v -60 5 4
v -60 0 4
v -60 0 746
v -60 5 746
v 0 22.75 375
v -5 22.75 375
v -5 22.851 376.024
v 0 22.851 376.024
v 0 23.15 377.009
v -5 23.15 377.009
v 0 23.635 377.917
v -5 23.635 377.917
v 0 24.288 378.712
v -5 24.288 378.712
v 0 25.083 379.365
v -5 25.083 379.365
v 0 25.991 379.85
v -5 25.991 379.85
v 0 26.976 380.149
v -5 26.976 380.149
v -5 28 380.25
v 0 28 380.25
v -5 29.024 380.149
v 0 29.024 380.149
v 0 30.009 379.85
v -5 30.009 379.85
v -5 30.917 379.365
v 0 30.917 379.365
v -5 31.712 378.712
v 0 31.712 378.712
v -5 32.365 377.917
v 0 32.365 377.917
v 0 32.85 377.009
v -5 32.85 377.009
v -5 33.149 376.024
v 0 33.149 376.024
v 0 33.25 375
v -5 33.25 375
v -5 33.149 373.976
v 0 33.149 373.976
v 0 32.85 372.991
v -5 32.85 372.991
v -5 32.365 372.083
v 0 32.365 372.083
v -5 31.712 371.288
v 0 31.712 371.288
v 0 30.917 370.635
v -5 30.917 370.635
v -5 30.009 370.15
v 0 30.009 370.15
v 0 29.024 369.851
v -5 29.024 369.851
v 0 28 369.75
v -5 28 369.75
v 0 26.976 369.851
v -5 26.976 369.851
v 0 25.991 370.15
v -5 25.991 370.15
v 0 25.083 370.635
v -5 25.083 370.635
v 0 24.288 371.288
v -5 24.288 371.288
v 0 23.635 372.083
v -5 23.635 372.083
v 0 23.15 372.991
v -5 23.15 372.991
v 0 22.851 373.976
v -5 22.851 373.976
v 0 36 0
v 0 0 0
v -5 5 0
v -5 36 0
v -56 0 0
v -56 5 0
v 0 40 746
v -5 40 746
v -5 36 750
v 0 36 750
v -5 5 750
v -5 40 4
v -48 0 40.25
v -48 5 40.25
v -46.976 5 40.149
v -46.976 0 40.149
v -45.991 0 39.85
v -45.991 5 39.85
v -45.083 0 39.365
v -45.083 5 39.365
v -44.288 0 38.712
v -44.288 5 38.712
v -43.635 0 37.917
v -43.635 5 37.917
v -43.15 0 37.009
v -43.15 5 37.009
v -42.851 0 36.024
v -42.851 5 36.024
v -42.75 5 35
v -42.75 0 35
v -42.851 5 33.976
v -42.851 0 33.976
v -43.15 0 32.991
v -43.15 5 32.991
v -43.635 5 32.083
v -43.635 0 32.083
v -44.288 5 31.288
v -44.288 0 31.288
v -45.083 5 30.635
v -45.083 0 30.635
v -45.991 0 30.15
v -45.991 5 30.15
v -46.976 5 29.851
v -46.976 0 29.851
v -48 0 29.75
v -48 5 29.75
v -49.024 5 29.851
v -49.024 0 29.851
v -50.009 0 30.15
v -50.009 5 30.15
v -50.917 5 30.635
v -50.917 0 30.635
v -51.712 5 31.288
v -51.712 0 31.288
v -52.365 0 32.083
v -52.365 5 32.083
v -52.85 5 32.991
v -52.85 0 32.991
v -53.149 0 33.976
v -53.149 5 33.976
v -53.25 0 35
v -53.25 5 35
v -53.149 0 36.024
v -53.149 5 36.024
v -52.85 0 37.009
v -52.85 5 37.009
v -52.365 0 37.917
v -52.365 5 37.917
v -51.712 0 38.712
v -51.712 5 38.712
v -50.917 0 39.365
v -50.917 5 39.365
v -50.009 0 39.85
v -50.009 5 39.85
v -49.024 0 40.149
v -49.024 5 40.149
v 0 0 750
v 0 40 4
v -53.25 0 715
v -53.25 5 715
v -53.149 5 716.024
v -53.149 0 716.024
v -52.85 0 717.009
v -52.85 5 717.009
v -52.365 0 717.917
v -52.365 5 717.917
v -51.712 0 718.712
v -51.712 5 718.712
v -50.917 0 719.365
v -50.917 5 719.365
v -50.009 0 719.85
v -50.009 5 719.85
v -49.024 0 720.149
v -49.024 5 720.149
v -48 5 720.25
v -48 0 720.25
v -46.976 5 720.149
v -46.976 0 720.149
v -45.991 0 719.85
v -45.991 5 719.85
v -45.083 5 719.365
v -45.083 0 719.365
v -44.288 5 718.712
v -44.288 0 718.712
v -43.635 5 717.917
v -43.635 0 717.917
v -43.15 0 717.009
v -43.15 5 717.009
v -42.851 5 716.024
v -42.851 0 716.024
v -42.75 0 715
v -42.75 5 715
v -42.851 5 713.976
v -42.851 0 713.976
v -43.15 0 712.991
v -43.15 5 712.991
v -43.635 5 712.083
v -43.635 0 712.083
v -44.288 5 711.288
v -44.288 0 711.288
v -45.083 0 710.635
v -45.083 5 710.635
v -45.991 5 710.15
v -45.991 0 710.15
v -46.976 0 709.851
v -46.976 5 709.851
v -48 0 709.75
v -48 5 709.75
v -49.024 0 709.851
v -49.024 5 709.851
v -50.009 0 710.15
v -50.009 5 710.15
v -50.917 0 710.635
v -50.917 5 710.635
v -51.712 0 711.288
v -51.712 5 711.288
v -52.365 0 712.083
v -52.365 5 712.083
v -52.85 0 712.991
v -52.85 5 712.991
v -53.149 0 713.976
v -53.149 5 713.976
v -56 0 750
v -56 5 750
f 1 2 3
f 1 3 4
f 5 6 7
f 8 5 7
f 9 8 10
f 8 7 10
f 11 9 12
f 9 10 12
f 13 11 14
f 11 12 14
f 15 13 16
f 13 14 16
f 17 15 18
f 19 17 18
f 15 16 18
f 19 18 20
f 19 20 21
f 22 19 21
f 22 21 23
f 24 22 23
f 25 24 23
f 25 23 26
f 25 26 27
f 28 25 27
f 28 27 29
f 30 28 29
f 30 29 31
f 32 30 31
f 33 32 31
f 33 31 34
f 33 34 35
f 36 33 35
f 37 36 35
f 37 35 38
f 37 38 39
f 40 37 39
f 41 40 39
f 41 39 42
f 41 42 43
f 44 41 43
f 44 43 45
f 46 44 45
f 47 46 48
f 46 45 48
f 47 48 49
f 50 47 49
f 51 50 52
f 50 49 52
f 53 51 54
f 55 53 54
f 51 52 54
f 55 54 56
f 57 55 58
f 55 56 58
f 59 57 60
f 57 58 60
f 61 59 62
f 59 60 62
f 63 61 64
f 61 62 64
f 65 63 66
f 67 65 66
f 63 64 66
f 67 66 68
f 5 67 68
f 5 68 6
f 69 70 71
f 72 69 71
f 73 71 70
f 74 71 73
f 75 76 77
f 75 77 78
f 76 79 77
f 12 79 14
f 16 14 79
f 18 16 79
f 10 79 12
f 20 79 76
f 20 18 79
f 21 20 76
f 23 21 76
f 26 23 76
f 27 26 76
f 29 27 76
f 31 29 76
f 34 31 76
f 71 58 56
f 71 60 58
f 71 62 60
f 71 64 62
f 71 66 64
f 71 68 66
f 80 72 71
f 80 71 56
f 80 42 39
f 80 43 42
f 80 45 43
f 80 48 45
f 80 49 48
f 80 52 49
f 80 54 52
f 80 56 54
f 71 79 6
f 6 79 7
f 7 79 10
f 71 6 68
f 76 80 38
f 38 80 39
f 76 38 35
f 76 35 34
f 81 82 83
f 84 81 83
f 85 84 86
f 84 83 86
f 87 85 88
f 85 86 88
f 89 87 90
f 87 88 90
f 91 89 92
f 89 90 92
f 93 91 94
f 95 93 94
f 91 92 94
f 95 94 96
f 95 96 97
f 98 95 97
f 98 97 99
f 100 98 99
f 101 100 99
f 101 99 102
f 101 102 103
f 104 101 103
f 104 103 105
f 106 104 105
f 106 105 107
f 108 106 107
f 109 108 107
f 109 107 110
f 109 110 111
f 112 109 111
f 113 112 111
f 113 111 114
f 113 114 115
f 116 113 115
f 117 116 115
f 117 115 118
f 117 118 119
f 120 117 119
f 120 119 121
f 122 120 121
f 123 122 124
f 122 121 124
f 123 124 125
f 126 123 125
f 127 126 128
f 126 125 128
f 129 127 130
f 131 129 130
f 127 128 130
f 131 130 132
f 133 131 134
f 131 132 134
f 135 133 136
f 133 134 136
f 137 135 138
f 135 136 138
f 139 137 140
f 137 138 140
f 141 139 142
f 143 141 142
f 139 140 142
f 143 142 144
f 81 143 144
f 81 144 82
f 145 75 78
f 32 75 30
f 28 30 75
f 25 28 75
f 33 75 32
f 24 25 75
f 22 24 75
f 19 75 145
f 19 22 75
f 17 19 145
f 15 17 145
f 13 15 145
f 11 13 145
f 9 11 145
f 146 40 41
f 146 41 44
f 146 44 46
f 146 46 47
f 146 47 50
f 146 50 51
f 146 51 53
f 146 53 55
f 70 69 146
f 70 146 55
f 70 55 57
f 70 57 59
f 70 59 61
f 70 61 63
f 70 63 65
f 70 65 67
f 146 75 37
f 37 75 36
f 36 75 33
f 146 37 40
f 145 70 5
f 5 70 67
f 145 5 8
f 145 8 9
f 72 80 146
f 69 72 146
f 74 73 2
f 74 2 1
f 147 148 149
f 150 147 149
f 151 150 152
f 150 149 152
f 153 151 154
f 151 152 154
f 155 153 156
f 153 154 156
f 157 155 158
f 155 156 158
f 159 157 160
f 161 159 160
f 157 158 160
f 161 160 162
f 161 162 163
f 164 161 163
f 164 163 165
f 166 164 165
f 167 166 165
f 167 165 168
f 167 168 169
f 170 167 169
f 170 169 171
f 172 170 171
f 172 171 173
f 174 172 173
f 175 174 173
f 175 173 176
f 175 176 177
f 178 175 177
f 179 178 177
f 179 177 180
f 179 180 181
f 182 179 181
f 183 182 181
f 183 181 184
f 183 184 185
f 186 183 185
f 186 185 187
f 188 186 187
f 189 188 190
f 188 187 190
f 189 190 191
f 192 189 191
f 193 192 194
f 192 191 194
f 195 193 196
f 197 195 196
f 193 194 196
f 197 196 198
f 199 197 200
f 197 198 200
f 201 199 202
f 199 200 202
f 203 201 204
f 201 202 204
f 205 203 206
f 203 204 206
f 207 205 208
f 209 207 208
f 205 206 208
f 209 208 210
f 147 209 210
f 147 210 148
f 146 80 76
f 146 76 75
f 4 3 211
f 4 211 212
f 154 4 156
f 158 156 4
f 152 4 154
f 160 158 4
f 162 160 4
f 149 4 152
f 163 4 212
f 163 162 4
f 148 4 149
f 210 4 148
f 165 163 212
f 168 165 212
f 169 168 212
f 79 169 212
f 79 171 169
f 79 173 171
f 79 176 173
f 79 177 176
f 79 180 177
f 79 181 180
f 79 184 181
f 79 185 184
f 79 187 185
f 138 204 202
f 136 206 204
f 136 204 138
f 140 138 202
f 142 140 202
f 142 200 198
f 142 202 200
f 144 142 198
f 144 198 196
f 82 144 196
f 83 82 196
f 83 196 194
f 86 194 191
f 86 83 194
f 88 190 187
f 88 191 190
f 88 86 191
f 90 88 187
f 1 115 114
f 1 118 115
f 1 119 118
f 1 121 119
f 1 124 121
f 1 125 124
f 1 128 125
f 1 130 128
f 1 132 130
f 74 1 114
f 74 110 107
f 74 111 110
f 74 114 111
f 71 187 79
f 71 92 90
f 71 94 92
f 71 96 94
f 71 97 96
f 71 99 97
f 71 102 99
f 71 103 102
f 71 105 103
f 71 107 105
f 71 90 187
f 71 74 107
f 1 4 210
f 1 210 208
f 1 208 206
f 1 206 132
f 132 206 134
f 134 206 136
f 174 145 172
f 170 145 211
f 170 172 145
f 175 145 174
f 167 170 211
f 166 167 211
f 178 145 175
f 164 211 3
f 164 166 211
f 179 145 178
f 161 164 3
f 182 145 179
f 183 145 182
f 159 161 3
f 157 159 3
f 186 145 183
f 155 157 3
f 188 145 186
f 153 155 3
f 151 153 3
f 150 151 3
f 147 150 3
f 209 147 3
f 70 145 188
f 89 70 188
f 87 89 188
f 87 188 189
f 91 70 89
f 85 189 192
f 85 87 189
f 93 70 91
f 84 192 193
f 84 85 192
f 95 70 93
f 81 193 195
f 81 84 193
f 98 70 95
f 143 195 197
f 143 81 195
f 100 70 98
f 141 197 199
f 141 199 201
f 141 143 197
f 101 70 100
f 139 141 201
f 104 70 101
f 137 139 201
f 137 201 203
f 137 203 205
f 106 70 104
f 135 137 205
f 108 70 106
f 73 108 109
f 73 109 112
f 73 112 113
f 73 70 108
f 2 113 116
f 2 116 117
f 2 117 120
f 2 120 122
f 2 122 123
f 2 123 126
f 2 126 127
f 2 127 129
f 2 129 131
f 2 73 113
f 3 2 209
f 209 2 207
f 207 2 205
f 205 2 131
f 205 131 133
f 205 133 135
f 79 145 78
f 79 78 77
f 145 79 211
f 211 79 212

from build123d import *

# Parameters (mm, degrees)
BOSS_EXTRUDE1_DEPTH = 750
CUT_EXTRUDE1_REACH  = 755.21
SKETCH4_R           = 5.25
CUT_EXTRUDE2_REACH  = 755.077
SKETCH5_R           = 5.25
CHAMFER1_SIZE       = 4


with BuildPart() as part:
    # Sketch1 → Boss-Extrude1 (new body)
    with BuildSketch(Plane.XY):
        Polygon((0, 0), (-60, 0), (-60, 5), (-5, 5), (-5, 40), (0, 40), align=None)
    extrude(amount=BOSS_EXTRUDE1_DEPTH)

    # Sketch4 → Cut-Extrude1 (cut, up to next)
    with BuildSketch(Plane(origin=(0, 5, 0), x_dir=(1, 0, 0), z_dir=(0, 1, 0)), mode=Mode.PRIVATE) as cut_extrude1_sk1:
        with Locations(Location((-48, -35, 0), (0, 0, 270))):
            Circle(SKETCH4_R)
    cut_extrude1_tool1 = extrude(cut_extrude1_sk1.sketch, amount=-CUT_EXTRUDE1_REACH, mode=Mode.PRIVATE) & part.part
    # Sketch4 → Cut-Extrude1 (cut, up to next)
    with BuildSketch(Plane(origin=(0, 5, 0), x_dir=(1, 0, 0), z_dir=(0, 1, 0)), mode=Mode.PRIVATE) as cut_extrude1_sk2:
        with Locations(Location((-48, -715, 0), (0, 0, 180))):
            Circle(SKETCH4_R)
    cut_extrude1_tool2 = extrude(cut_extrude1_sk2.sketch, amount=-CUT_EXTRUDE1_REACH, mode=Mode.PRIVATE) & part.part
    add(cut_extrude1_tool1.solids().sort_by_distance((-48, 5, 35))[0], mode=Mode.SUBTRACT)
    add(cut_extrude1_tool2.solids().sort_by_distance((-48, 5, 715))[0], mode=Mode.SUBTRACT)

    # Sketch5 → Cut-Extrude2 (cut, up to next)
    with BuildSketch(Plane.ZY.offset(5), mode=Mode.PRIVATE) as cut_extrude2_sk1:
        with Locations(Location((375, 28, 0), (0, 0, 270))):
            Circle(SKETCH5_R)
    cut_extrude2_tool1 = extrude(cut_extrude2_sk1.sketch, amount=-CUT_EXTRUDE2_REACH, mode=Mode.PRIVATE) & part.part
    add(cut_extrude2_tool1.solids().sort_by_distance((-5, 28, 375))[0], mode=Mode.SUBTRACT)

    # Chamfer1
    chamfer1_edges = [part.edges().sort_by_distance(p)[0] for p in [
        (-60, 2.5, 750),
        (-60, 2.5, 0),
        (-2.5, 40, 750),
        (-2.5, 40, 0),
    ]]
    chamfer(chamfer1_edges, length=CHAMFER1_SIZE)


solid = part.part
